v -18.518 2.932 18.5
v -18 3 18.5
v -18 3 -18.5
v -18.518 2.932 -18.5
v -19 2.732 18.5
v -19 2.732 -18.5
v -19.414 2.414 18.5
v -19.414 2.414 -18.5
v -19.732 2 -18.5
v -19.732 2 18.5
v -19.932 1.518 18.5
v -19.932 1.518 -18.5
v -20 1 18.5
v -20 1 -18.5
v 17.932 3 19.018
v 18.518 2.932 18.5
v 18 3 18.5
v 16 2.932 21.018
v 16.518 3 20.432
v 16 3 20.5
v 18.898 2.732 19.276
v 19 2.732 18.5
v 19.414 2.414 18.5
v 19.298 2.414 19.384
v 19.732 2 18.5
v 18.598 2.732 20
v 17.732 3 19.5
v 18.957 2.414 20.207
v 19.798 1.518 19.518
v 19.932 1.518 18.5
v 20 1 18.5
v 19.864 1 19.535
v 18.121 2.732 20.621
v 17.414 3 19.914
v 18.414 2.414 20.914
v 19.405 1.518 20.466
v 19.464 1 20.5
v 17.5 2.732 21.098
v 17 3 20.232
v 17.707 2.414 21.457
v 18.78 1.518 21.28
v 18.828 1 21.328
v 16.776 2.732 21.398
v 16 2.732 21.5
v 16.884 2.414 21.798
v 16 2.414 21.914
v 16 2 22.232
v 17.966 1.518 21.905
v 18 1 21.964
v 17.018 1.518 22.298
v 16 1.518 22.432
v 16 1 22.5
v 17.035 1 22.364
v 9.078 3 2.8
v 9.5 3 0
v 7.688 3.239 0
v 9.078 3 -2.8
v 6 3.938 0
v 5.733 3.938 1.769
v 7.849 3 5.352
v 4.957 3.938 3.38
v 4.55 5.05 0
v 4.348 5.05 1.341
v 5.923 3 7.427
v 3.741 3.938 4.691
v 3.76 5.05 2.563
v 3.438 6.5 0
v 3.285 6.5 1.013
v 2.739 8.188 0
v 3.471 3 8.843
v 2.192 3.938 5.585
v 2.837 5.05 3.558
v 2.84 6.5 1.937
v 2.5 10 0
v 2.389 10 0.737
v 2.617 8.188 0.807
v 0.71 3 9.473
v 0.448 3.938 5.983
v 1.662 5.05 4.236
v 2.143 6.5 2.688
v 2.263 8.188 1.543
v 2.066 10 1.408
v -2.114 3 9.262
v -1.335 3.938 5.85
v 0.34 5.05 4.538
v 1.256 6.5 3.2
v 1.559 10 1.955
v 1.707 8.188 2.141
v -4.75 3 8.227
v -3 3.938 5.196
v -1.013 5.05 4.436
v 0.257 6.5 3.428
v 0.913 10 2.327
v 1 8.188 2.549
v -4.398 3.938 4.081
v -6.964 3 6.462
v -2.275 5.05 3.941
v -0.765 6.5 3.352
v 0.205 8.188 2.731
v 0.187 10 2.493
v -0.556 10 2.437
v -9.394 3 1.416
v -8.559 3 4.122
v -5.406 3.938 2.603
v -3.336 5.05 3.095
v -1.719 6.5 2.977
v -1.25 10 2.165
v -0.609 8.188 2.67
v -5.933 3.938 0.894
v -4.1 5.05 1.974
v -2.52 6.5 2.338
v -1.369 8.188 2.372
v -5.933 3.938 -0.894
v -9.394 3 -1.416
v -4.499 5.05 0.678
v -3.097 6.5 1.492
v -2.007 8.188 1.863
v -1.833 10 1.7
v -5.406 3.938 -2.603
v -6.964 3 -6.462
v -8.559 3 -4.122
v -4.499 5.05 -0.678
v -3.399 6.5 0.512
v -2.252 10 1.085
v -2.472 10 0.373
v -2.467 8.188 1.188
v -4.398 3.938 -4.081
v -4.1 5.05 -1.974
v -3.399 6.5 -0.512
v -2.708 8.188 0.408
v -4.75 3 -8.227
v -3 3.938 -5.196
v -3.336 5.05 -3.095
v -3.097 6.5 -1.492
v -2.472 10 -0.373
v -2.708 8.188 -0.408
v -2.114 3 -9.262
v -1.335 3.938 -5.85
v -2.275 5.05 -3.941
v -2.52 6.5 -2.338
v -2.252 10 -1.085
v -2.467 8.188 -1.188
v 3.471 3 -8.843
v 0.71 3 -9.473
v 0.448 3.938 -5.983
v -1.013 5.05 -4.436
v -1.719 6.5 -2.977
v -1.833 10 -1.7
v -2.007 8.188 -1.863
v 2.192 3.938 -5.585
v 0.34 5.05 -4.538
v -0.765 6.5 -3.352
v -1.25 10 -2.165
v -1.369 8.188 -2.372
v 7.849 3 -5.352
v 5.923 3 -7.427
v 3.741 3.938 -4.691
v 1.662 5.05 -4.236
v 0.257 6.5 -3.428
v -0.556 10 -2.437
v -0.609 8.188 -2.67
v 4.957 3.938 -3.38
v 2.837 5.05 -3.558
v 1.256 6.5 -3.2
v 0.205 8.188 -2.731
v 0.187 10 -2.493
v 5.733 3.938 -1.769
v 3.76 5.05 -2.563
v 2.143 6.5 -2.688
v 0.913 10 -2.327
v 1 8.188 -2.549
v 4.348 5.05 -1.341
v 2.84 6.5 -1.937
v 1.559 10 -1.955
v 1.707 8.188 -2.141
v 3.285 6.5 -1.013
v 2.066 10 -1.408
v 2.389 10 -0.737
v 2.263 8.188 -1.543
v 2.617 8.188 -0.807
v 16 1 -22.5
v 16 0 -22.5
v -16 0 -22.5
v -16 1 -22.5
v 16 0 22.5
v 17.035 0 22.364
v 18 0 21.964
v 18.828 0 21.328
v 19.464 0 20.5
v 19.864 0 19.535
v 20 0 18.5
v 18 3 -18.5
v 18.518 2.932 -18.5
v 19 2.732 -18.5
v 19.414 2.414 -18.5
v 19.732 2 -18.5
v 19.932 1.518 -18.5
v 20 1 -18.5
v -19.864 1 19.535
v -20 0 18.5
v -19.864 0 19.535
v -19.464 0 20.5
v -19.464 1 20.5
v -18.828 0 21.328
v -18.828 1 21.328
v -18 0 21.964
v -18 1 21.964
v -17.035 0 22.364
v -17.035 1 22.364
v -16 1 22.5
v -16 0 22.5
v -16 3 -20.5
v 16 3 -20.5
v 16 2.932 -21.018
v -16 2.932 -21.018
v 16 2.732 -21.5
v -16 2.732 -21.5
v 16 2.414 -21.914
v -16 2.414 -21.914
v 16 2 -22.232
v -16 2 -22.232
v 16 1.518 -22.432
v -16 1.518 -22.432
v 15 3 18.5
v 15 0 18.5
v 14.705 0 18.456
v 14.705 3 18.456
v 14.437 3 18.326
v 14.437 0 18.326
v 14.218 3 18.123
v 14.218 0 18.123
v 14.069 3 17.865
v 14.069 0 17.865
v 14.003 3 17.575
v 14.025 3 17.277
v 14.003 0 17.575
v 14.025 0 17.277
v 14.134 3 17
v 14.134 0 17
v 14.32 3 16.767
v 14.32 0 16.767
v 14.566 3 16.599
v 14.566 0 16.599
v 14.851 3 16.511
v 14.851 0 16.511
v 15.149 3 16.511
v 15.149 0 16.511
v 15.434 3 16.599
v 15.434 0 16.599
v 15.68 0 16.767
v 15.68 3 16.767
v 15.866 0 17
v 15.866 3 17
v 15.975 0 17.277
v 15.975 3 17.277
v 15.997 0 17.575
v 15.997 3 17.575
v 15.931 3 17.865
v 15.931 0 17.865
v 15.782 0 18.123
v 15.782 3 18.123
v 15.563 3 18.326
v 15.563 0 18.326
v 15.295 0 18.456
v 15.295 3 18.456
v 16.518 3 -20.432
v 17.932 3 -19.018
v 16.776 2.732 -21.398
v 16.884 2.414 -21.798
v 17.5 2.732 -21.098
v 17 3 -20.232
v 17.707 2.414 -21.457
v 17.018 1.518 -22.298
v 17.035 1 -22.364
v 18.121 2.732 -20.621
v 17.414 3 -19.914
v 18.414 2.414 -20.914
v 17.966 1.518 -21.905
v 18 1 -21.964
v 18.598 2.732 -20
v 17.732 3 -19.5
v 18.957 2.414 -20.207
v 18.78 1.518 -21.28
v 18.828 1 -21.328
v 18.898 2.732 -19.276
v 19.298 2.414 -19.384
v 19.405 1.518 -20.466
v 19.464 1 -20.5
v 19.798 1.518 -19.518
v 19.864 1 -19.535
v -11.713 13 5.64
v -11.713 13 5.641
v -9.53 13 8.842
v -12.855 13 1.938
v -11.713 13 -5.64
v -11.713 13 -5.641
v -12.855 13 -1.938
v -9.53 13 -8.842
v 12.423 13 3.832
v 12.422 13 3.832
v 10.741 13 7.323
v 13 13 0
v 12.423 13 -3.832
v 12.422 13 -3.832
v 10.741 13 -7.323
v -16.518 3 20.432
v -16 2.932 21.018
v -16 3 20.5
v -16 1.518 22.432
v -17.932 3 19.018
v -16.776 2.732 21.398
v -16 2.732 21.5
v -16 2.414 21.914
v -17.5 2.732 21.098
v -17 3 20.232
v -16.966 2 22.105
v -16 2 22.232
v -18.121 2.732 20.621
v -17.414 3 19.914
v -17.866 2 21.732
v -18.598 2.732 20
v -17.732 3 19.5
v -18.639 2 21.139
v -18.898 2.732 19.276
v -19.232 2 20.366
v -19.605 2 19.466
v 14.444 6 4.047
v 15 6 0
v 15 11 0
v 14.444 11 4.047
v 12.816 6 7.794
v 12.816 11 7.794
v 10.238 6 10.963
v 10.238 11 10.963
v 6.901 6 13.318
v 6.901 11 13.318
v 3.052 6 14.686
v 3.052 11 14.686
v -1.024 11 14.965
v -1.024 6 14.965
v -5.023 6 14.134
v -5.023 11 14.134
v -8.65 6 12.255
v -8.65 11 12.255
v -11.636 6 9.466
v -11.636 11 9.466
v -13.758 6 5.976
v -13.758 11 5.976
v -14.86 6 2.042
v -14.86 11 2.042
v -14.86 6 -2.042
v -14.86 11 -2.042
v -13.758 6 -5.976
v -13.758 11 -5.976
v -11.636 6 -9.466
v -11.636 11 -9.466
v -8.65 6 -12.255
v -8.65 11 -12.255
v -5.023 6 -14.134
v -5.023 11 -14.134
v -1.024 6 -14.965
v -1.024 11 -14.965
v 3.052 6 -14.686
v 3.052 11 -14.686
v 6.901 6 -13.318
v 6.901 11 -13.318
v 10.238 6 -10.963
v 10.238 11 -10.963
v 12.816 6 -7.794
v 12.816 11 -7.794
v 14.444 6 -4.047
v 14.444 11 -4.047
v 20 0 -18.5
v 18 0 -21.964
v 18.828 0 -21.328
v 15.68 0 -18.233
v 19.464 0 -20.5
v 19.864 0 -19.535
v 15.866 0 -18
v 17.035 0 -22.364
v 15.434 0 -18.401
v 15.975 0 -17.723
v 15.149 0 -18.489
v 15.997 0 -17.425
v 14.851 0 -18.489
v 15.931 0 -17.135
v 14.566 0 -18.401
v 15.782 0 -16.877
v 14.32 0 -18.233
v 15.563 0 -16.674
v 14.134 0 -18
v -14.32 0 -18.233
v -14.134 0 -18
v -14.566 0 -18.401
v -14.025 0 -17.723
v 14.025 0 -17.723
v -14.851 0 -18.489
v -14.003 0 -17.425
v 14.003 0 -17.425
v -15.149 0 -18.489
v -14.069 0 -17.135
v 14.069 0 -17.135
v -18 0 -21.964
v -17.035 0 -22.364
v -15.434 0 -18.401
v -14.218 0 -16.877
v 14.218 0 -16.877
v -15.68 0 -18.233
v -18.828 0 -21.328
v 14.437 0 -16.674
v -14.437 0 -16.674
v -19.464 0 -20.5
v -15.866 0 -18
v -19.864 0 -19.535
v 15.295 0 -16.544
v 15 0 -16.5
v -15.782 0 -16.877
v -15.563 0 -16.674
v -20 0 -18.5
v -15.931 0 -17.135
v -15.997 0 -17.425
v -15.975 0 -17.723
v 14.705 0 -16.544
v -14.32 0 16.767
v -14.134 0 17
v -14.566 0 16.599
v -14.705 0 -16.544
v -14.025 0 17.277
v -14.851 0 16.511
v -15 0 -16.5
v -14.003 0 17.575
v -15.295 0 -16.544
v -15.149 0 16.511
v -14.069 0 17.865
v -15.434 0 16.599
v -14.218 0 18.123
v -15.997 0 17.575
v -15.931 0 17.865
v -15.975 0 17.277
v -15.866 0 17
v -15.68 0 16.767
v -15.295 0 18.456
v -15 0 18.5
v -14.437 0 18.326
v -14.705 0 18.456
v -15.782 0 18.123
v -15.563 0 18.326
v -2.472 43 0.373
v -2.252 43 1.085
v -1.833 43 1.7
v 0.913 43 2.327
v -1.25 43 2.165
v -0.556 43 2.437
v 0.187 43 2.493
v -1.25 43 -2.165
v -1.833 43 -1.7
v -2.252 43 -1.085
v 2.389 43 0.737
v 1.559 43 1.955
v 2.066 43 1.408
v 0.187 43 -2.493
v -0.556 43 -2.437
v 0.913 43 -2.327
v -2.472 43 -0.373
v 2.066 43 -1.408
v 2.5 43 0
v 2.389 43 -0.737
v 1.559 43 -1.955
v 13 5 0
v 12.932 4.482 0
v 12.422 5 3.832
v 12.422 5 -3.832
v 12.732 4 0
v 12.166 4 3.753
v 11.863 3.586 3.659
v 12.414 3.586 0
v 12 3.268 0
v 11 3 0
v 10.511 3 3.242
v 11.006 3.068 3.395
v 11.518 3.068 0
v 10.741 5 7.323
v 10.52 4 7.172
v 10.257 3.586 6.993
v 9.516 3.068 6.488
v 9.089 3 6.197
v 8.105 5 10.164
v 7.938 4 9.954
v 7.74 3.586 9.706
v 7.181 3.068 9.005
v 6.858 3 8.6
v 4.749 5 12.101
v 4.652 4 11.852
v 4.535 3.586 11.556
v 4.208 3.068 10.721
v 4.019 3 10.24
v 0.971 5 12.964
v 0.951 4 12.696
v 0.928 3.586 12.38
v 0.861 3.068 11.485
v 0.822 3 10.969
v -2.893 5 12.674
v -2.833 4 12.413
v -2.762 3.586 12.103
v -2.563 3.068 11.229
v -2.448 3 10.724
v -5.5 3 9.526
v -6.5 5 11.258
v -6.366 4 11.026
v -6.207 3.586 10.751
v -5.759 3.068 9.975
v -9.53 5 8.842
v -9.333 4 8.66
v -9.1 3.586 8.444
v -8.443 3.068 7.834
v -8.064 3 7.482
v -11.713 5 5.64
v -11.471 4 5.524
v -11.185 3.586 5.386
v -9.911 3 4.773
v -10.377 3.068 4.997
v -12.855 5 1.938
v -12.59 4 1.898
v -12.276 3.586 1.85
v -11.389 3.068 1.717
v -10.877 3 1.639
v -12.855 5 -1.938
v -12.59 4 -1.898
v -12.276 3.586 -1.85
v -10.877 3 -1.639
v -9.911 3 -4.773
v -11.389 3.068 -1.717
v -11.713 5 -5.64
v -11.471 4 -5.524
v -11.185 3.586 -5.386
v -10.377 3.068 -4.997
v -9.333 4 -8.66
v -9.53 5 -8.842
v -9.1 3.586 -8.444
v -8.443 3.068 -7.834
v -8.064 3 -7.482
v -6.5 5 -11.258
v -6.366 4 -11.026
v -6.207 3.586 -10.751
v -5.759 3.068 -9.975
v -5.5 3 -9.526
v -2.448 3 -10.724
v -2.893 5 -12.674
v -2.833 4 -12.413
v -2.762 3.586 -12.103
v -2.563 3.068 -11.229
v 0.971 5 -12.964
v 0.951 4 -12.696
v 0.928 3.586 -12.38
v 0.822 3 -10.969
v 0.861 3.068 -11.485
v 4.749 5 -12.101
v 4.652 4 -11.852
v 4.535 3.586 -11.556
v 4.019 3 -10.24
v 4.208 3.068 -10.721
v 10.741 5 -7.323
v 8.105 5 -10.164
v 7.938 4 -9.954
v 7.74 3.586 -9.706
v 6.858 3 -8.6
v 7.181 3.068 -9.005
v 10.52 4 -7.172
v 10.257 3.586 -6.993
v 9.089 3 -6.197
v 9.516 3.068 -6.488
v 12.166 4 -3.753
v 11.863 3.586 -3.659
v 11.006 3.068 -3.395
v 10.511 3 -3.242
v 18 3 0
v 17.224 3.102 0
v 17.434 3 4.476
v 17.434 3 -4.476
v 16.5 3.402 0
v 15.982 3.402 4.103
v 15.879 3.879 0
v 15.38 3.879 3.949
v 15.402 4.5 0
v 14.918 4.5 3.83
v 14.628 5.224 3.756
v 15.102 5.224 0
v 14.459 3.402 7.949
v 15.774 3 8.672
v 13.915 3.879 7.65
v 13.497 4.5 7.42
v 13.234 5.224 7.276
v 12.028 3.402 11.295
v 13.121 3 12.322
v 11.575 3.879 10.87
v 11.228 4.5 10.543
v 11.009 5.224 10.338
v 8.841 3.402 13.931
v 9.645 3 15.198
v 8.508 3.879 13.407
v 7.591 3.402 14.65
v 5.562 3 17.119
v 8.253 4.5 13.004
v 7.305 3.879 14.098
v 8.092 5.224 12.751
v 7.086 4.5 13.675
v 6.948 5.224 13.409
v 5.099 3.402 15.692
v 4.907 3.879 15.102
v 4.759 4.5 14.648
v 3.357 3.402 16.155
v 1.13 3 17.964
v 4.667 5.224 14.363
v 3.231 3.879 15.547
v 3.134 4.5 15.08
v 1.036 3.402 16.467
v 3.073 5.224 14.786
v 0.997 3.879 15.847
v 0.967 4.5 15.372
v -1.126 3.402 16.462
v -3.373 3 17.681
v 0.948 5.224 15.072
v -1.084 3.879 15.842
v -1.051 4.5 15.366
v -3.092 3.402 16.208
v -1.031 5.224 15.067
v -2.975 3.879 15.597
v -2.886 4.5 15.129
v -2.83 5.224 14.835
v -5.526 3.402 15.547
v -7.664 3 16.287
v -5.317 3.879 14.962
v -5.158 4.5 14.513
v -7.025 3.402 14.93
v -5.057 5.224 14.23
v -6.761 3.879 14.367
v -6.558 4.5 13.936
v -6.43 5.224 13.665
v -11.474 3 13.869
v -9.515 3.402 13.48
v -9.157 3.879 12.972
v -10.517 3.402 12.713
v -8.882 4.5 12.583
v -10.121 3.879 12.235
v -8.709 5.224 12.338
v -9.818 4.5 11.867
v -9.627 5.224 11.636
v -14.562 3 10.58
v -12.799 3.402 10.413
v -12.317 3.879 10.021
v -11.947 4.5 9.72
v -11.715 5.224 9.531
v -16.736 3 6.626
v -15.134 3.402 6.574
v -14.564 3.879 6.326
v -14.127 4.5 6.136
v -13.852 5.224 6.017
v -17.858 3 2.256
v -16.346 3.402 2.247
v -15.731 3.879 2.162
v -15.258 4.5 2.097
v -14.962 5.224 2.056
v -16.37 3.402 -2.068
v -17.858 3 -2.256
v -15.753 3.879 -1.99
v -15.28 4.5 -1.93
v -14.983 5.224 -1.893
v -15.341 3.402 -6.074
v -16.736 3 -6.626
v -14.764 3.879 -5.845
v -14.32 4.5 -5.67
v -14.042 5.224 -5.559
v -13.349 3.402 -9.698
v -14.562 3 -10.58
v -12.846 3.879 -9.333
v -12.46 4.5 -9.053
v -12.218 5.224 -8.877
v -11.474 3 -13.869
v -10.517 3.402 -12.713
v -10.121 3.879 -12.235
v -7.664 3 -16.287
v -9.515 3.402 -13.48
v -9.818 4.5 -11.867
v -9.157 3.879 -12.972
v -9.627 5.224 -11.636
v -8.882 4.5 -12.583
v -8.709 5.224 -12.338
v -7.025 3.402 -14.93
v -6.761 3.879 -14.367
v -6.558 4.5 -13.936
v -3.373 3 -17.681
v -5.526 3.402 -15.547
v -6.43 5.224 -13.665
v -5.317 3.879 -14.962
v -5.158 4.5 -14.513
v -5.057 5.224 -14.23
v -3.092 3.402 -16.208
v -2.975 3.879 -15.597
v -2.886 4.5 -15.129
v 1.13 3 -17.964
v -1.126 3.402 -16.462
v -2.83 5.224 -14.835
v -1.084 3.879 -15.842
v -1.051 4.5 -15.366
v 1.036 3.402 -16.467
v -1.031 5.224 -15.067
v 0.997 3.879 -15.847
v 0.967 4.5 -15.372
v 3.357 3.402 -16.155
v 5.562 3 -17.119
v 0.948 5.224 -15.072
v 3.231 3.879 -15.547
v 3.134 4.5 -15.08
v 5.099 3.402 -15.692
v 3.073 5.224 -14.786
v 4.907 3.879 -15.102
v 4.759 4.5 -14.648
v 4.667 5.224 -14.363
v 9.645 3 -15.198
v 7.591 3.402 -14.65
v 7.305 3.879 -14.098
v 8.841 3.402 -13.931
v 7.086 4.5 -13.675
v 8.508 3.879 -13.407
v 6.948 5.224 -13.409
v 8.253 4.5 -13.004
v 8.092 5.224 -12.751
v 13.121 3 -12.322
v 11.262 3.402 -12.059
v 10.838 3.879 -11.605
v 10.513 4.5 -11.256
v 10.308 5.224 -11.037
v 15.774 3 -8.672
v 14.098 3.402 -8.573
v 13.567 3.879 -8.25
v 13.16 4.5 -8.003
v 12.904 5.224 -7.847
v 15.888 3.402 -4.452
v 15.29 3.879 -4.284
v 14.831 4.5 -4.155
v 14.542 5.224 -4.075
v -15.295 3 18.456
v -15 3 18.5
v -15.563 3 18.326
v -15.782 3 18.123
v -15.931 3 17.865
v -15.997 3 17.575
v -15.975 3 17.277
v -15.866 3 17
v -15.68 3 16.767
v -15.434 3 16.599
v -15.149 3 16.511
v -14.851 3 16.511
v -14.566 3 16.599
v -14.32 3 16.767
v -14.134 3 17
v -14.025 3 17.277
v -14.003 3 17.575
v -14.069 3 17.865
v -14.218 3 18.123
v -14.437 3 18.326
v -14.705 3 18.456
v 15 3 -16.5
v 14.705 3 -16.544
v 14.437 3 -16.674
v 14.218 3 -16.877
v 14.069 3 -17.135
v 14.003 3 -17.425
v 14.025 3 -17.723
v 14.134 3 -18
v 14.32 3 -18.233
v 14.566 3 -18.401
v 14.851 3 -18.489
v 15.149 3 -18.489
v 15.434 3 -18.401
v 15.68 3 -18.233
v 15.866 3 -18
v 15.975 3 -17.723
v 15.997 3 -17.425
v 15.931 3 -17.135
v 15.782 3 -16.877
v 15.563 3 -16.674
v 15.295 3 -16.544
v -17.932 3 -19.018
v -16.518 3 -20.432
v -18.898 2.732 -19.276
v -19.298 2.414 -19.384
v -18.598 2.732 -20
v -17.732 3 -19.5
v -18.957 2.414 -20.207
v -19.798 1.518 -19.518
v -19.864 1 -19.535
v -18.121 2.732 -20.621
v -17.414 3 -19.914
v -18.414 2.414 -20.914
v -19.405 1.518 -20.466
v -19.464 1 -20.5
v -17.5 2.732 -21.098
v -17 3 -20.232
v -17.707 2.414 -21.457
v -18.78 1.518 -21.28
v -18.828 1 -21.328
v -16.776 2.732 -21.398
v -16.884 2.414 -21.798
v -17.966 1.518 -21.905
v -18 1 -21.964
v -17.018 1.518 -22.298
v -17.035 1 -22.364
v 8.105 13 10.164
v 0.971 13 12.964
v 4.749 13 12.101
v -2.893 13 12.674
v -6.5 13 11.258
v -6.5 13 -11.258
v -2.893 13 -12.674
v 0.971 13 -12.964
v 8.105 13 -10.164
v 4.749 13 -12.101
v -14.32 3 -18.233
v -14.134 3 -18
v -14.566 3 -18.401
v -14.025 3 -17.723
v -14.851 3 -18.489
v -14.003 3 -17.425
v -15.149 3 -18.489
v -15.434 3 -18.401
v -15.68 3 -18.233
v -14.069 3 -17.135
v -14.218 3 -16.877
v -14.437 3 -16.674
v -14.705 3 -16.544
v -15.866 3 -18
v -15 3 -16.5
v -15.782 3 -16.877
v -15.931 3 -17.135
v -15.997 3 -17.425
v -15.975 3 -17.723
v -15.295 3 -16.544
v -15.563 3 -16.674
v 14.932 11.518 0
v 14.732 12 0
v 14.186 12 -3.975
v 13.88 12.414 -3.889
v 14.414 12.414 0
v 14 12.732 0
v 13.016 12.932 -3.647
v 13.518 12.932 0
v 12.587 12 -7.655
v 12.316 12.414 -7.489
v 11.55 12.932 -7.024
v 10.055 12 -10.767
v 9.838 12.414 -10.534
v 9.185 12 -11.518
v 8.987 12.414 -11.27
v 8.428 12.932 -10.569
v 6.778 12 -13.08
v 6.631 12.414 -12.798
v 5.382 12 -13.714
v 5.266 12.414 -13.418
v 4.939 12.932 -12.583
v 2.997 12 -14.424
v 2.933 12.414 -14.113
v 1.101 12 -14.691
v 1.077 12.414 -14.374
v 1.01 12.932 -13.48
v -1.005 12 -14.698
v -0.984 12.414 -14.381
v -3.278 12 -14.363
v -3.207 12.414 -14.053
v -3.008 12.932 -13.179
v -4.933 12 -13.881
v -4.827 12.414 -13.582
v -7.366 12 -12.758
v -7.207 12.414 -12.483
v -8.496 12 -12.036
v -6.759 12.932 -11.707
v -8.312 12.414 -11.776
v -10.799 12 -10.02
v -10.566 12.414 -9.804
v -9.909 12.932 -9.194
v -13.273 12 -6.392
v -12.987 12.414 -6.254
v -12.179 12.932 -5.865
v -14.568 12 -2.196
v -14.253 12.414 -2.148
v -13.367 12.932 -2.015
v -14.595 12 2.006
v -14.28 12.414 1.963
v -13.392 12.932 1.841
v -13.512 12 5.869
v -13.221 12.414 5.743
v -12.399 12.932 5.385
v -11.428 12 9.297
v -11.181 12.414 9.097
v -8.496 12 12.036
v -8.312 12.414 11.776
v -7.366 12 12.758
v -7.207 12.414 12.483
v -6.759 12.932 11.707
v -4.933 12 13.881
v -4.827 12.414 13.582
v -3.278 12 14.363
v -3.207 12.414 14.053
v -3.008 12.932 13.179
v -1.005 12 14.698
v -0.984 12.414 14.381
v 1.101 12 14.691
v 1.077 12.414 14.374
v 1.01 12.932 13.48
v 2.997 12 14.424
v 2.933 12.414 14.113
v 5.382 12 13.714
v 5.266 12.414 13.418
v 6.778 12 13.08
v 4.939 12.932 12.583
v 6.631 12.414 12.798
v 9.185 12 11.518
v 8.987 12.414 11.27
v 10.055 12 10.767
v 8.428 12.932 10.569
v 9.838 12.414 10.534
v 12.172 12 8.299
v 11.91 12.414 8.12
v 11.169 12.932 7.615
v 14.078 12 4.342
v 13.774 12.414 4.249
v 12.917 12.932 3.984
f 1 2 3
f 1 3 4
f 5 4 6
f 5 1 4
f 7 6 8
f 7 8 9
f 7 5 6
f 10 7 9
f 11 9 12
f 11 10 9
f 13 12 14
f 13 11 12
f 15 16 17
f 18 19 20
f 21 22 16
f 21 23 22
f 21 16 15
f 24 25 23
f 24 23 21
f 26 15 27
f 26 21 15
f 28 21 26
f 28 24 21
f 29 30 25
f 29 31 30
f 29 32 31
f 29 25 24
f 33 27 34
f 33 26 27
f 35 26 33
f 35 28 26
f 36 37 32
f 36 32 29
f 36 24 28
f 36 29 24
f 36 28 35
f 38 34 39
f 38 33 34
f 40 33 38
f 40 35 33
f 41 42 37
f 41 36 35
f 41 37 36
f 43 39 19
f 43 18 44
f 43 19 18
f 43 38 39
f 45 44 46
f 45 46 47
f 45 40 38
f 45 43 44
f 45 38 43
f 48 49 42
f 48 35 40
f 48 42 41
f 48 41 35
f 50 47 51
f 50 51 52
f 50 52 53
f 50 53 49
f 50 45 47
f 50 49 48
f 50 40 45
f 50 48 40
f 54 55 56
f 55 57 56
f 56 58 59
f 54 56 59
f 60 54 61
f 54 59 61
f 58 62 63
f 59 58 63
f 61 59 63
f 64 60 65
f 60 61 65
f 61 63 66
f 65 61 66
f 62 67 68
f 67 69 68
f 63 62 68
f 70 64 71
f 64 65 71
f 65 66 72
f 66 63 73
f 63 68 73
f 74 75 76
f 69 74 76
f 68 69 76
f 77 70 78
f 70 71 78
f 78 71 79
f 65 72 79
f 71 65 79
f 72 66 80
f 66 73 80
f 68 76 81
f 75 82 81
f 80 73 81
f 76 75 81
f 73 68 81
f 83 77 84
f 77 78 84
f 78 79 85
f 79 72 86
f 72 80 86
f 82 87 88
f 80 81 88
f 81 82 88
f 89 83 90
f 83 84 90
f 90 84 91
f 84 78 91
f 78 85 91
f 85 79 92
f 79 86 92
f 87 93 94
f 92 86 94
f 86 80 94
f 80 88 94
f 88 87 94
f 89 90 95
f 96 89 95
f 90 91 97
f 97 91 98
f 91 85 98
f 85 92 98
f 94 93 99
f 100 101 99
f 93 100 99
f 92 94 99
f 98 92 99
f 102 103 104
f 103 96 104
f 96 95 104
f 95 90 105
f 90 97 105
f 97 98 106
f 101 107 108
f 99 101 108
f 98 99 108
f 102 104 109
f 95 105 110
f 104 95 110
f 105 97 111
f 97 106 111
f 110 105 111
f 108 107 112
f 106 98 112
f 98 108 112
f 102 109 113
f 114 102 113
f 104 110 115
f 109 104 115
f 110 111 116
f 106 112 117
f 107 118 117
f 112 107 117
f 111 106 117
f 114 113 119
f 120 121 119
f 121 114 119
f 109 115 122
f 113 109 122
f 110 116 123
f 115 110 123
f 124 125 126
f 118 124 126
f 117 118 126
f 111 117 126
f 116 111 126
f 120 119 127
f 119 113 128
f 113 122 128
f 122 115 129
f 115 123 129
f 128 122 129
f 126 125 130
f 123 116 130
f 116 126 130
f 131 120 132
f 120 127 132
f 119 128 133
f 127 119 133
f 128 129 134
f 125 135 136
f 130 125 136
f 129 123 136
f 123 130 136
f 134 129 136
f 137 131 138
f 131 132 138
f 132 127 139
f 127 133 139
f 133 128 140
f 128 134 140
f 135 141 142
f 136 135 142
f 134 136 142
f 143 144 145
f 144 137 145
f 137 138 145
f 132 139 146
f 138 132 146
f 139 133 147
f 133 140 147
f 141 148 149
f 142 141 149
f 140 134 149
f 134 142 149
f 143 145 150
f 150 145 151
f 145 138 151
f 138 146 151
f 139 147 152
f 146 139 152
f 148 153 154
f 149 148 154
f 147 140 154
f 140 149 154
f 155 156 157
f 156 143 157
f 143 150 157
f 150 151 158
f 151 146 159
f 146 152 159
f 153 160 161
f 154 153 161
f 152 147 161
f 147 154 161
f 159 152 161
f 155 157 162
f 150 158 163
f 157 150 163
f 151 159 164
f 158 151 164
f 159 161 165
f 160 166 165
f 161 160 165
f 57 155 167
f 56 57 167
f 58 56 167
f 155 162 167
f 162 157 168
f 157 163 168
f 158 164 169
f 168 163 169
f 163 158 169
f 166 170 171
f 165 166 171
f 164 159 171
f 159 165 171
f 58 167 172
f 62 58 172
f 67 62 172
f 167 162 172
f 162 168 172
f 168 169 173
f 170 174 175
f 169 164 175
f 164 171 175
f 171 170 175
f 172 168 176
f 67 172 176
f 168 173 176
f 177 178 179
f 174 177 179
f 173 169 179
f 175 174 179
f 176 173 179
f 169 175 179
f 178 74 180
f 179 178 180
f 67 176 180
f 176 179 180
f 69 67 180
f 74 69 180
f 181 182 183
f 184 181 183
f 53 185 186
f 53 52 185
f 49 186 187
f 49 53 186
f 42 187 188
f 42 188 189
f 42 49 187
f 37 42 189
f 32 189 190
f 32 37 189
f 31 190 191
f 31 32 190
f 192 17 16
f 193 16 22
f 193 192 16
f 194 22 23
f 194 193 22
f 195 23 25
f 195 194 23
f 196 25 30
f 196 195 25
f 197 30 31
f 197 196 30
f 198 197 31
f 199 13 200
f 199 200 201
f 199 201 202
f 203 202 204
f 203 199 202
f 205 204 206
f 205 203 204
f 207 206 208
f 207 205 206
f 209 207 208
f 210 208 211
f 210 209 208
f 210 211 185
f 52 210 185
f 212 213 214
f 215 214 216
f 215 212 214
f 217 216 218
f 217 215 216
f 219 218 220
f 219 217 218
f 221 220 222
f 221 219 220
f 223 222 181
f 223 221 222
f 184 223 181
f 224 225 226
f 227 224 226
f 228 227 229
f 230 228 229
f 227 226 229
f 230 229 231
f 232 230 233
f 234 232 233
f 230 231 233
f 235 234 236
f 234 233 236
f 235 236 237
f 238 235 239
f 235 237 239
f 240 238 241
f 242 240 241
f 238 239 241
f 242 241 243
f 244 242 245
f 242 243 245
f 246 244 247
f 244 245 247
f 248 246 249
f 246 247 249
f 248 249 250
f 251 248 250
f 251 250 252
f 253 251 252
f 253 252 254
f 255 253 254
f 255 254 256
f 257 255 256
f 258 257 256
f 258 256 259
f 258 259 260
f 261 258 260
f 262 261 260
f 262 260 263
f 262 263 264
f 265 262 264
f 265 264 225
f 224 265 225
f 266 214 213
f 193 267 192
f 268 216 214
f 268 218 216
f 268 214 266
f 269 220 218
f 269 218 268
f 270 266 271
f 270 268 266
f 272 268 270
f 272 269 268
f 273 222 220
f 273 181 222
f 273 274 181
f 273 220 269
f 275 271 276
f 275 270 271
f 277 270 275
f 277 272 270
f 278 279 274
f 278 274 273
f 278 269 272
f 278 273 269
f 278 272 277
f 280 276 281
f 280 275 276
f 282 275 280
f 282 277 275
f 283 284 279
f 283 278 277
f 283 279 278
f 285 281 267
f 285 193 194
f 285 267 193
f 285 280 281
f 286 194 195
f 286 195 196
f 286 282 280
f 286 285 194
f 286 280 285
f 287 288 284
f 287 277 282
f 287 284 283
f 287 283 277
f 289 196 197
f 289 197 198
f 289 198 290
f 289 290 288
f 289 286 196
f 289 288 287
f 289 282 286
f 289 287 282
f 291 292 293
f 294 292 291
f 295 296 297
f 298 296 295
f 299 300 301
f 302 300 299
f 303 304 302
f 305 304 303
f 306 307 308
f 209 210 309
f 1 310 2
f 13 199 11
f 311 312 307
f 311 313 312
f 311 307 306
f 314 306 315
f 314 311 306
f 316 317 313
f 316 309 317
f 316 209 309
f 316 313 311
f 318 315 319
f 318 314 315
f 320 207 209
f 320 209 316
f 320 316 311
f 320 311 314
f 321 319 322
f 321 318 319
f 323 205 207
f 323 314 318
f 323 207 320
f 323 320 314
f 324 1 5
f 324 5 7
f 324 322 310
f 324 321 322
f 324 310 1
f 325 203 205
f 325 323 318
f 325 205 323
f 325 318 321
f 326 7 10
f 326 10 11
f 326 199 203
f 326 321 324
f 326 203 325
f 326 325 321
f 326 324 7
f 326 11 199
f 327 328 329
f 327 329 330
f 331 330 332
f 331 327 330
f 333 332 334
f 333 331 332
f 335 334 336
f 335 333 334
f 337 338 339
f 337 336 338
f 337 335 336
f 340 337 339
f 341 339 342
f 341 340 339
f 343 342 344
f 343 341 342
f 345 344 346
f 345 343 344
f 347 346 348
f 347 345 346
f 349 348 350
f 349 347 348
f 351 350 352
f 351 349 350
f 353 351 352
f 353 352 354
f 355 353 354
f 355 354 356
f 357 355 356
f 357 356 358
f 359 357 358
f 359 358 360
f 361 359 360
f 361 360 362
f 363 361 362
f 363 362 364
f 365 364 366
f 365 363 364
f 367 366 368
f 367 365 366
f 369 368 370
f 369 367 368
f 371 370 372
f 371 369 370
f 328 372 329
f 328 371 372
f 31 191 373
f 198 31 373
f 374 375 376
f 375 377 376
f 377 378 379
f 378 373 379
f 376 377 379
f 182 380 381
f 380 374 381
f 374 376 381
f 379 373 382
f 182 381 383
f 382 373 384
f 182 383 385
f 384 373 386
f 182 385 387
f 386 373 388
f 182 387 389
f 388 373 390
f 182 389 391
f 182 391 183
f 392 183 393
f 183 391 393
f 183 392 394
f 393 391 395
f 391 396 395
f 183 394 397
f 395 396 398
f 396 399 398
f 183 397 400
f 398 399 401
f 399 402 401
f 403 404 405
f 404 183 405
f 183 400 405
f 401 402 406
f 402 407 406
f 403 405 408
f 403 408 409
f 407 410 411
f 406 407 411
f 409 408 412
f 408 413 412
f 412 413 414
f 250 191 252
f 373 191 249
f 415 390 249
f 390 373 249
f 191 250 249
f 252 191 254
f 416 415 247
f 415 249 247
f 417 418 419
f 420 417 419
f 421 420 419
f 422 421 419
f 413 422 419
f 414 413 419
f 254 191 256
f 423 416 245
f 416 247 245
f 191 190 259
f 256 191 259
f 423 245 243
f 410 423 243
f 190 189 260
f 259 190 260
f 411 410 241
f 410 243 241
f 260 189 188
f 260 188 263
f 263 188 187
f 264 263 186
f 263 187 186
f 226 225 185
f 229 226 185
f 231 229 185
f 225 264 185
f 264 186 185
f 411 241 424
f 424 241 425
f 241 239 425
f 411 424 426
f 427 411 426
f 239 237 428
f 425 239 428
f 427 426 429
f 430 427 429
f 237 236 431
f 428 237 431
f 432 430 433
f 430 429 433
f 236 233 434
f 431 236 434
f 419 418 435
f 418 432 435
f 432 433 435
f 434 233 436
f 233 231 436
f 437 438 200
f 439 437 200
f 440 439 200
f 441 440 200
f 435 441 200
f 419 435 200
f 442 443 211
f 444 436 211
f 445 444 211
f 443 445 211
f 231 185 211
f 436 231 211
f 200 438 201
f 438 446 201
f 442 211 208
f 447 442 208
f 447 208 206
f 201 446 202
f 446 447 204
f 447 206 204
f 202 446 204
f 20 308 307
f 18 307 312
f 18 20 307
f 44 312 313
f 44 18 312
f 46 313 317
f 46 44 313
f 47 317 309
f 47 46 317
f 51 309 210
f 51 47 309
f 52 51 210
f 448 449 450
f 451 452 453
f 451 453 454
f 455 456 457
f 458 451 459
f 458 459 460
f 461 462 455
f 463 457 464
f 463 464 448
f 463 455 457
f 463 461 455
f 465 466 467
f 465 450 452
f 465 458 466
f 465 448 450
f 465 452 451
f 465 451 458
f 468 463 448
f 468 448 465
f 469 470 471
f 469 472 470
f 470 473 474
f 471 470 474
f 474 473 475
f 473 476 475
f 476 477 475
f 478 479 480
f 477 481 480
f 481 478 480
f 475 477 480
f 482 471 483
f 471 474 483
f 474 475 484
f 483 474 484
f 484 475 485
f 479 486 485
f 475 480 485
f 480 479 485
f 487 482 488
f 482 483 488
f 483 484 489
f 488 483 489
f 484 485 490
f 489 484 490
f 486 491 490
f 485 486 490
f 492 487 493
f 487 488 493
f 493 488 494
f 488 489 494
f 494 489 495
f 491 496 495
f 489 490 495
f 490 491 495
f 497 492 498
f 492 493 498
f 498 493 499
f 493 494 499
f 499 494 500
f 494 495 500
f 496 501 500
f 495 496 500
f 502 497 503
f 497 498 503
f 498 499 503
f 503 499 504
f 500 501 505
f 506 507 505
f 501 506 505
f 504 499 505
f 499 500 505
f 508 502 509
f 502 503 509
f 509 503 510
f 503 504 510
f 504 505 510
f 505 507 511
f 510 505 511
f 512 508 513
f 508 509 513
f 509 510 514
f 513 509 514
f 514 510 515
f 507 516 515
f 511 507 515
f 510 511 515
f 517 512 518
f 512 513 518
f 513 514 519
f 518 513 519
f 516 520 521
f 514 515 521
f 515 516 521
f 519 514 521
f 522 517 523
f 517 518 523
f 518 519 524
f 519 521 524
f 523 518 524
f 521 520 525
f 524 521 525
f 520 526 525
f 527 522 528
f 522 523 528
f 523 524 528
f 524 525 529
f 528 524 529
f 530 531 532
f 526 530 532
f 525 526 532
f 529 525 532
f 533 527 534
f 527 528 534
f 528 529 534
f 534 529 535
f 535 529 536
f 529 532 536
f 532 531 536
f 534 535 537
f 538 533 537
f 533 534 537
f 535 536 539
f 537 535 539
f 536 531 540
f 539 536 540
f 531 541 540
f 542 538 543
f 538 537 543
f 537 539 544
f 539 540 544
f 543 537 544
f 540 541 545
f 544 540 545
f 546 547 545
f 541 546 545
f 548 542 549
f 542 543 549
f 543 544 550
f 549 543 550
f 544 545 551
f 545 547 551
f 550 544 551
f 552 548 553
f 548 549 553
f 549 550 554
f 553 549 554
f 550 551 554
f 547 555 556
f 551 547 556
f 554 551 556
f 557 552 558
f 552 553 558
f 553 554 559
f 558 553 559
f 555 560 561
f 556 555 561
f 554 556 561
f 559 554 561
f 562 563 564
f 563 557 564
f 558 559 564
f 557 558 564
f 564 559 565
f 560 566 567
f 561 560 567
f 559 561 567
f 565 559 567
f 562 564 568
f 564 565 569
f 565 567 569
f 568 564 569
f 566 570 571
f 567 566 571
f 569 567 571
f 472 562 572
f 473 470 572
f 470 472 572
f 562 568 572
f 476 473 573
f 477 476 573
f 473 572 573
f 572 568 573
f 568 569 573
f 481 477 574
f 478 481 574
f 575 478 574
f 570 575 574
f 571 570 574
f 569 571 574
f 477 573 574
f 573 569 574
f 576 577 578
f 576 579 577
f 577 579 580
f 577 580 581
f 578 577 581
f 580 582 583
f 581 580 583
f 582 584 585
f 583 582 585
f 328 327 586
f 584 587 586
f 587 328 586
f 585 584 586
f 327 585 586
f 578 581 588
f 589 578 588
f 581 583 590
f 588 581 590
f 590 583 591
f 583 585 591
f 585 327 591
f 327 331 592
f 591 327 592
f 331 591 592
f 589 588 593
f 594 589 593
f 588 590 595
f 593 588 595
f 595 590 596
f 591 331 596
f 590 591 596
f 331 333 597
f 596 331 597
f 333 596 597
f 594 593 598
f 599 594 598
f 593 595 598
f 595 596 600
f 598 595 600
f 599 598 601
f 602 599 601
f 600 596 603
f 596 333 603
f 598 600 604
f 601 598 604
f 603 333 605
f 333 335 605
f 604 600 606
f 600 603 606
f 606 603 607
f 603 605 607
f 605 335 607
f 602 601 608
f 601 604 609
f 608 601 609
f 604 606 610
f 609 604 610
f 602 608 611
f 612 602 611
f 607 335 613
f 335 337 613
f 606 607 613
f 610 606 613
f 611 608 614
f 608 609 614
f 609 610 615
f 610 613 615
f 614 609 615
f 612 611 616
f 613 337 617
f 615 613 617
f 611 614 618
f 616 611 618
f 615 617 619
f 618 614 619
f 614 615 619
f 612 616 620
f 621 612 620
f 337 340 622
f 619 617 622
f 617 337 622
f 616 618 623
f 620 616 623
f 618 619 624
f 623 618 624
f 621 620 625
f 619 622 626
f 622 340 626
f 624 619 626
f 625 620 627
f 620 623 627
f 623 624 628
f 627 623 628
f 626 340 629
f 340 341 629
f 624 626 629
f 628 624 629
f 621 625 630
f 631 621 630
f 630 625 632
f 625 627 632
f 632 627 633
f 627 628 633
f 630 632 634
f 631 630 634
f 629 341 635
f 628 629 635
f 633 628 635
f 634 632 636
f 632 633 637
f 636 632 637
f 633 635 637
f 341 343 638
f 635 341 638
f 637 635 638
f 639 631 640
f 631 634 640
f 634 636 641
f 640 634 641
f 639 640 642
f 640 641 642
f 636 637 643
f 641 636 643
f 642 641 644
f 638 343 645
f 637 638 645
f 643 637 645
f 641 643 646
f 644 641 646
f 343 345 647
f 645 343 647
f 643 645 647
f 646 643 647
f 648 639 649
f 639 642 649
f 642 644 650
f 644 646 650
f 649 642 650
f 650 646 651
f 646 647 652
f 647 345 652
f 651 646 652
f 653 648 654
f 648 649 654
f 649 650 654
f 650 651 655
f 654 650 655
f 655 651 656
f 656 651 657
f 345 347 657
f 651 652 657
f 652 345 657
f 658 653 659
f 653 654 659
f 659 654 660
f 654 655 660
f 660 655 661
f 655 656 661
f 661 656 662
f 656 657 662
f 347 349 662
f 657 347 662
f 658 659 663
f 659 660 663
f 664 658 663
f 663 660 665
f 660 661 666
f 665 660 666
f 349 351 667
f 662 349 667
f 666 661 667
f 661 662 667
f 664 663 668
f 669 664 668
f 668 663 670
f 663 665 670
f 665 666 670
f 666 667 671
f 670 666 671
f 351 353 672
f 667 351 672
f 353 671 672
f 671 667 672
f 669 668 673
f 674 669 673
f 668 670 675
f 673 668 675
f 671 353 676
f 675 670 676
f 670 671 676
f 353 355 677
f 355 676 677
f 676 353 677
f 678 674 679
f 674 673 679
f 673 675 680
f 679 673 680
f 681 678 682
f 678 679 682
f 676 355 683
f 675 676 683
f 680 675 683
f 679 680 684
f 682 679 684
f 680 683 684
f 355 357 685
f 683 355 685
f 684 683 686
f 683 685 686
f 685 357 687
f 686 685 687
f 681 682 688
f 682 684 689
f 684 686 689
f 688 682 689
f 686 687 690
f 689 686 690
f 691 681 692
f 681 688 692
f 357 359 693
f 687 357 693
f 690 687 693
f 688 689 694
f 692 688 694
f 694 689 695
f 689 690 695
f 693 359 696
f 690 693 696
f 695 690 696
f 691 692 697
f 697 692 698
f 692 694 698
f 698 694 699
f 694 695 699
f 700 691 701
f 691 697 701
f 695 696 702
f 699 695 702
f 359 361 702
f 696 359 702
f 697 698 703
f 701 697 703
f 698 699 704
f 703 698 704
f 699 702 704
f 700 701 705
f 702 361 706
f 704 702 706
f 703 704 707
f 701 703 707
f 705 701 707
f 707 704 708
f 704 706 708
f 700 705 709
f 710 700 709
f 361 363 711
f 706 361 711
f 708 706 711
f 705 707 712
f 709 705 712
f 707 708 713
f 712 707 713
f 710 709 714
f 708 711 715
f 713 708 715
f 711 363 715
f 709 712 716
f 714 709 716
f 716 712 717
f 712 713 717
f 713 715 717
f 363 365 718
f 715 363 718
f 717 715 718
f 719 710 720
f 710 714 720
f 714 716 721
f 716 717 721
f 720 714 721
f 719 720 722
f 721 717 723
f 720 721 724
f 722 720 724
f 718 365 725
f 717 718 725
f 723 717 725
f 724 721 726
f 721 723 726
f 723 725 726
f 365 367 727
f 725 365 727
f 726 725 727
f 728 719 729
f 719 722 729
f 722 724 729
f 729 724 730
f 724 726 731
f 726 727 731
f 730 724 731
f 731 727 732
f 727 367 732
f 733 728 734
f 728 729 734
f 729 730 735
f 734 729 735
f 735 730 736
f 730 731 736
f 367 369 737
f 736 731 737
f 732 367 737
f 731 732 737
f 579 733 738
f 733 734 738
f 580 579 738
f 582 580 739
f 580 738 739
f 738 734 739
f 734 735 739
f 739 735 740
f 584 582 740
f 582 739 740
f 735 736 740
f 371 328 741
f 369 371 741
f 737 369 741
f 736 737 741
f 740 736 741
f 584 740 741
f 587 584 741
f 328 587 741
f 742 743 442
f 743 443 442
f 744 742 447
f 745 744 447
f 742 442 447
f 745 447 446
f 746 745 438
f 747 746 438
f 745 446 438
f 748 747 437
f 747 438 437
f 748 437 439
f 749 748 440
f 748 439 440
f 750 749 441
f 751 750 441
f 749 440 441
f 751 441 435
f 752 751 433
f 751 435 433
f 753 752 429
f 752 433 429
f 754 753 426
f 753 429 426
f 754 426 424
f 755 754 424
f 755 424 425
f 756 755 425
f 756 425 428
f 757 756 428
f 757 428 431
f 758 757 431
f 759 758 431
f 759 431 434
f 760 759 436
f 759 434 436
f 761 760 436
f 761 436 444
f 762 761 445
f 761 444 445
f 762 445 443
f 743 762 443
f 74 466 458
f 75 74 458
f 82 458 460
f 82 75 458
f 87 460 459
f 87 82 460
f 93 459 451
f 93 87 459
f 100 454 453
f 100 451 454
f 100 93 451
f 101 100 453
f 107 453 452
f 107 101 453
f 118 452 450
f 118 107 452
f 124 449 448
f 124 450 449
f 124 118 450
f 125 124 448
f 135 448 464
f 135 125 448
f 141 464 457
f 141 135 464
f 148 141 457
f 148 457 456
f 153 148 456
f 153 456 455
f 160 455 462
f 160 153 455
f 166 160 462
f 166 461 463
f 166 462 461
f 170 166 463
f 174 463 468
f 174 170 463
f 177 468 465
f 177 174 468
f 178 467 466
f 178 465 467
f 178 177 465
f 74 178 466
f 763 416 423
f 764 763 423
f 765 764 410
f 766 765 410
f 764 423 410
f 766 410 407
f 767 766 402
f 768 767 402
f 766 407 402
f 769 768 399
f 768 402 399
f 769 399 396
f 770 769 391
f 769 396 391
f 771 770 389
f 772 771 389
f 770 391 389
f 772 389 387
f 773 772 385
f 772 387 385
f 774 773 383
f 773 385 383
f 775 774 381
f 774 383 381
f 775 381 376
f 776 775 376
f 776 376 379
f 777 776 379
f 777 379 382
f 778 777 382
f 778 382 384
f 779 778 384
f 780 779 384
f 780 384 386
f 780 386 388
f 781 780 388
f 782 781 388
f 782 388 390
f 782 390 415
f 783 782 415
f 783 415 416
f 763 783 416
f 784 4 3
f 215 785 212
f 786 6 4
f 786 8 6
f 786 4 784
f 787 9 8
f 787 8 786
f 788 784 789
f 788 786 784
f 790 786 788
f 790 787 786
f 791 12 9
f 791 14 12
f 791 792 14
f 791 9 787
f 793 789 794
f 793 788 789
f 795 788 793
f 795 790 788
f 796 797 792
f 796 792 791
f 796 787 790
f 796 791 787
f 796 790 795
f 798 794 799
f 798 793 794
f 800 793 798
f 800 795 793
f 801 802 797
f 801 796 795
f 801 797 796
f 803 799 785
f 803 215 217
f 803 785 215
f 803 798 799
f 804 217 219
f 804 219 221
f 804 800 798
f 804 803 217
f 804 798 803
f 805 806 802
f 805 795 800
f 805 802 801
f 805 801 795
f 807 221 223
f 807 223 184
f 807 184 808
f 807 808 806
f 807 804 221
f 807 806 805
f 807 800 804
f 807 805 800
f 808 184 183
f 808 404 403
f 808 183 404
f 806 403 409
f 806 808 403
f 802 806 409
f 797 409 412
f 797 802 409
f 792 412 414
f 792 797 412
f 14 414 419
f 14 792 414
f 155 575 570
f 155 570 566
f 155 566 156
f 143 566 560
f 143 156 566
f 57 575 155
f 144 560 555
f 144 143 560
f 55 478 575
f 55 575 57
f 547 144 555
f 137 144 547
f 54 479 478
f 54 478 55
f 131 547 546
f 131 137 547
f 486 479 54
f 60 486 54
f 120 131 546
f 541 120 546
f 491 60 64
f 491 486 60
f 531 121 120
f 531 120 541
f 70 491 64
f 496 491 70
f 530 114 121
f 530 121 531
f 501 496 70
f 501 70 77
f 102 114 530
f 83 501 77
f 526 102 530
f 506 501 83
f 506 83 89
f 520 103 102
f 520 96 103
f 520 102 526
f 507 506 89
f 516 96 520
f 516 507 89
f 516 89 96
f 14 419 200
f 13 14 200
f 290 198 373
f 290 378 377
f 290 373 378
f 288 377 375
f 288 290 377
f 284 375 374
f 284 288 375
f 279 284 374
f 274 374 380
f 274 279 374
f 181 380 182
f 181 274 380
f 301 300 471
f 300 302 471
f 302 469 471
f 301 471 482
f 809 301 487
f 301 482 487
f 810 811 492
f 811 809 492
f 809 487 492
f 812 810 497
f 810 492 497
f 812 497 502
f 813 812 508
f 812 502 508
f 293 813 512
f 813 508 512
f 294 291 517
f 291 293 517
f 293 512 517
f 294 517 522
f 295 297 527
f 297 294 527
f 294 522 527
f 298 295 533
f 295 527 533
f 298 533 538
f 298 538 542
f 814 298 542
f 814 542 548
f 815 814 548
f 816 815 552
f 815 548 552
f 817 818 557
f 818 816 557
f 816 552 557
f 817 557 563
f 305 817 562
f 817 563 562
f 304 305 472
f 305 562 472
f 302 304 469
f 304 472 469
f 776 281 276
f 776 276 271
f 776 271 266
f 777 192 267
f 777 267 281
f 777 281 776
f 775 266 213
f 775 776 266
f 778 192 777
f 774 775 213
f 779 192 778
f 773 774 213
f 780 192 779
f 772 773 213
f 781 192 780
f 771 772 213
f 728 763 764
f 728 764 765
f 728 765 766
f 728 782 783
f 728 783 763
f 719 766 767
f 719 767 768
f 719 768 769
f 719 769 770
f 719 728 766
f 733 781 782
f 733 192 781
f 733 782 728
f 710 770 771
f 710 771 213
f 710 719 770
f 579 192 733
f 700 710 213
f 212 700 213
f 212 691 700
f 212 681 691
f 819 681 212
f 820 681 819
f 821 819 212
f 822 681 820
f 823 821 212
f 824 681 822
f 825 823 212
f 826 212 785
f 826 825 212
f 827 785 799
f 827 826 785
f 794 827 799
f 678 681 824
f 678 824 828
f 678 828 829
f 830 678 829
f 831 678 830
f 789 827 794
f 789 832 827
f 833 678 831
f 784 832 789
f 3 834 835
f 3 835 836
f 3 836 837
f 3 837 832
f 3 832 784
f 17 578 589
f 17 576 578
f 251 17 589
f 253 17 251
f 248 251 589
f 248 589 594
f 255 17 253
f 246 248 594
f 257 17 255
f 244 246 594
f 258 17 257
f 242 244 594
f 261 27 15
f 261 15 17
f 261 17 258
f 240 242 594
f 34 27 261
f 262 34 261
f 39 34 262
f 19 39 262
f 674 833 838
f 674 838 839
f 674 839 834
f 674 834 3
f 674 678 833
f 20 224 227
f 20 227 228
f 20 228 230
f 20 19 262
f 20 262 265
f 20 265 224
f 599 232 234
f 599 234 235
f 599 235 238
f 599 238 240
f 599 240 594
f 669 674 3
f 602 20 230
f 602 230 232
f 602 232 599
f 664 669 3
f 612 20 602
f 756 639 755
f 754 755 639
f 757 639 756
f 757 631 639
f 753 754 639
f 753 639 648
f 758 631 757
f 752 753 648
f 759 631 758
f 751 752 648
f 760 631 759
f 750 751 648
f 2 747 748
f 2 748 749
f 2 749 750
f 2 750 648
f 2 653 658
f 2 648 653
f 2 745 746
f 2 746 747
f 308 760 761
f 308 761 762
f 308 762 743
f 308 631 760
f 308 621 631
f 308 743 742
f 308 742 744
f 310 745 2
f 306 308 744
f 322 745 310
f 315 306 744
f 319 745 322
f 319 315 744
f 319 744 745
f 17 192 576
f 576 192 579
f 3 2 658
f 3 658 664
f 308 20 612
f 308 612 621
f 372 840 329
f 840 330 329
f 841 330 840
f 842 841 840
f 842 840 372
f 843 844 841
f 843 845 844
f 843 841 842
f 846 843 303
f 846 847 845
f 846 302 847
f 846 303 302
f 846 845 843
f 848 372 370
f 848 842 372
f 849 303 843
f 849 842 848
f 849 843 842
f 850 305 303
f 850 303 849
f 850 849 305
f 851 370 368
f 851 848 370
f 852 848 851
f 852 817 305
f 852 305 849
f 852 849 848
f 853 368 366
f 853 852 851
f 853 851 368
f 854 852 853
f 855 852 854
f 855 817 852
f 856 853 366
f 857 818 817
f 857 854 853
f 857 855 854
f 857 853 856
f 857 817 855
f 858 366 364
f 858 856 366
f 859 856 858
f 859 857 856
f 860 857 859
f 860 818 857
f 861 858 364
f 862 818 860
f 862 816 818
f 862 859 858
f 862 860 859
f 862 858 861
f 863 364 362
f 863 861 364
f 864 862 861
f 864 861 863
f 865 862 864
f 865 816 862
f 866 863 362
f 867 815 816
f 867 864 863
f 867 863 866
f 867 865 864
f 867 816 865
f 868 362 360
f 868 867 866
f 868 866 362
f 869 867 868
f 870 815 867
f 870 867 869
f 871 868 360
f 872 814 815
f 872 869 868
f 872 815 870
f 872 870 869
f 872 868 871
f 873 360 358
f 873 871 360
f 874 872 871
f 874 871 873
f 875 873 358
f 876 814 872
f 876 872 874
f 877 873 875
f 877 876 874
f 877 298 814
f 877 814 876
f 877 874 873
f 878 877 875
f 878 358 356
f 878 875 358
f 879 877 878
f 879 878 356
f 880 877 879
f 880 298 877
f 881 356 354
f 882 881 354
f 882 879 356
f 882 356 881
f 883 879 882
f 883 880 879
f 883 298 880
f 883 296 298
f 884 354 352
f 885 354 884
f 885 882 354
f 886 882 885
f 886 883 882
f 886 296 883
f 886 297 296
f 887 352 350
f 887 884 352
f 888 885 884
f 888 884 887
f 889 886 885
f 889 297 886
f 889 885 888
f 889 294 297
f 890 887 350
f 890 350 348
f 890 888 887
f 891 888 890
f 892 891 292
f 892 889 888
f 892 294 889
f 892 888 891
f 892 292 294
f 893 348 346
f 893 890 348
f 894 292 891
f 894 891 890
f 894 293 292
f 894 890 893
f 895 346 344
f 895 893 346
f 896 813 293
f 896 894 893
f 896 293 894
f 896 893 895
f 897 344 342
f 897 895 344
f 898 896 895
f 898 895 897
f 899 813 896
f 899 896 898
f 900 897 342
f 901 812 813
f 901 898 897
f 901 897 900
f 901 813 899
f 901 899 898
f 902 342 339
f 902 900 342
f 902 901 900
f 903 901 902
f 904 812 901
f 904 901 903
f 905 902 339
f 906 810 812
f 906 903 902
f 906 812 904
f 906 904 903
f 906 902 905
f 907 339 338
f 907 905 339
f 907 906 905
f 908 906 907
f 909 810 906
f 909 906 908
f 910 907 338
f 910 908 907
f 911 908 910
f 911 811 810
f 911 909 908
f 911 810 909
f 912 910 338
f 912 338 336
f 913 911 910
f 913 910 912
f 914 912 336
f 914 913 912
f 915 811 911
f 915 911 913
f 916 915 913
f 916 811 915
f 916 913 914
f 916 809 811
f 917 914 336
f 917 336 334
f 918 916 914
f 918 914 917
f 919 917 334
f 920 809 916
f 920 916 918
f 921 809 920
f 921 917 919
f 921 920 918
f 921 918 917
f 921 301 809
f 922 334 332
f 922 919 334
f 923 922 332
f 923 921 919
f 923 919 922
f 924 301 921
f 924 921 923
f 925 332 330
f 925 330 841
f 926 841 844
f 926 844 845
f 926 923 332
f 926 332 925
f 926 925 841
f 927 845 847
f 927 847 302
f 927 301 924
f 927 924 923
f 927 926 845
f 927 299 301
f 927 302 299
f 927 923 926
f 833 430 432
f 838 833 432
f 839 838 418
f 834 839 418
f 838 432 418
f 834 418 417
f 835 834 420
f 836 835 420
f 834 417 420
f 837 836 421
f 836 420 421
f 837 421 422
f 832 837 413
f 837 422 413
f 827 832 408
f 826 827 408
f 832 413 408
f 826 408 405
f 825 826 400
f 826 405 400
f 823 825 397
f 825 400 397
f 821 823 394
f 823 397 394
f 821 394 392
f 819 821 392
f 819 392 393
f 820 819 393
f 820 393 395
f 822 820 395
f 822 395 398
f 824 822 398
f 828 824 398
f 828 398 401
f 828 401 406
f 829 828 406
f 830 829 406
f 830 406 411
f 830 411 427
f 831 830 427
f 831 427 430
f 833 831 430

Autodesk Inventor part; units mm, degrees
ref_plane "YZ Plane" through (0, 0, 0) normal (1, 0, 0) x (0, 1, 0)
ref_plane "XZ Plane" through (0, 0, 0) normal (0, 1, 0) x (-1, 0, 0)
ref_plane "XY Plane" through (0, 0, 0) normal (0, 0, 1) x (1, 0, 0)
sketch "Sketch1" plane through (0, 0, 0) normal (0, 1, 0) x (-1, 0, 0)
  line L0 (20, 22.5) -> (-20, 22.5)
  line L1 (-20, 22.5) -> (-20, -22.5)
  line L2 (-20, -22.5) -> (20, -22.5)
  line L3 (20, -22.5) -> (20, 22.5)
  point P0 (0, 0)
  point P1 (-20, 0)
  point P2 (20, 0)
  point P3 (0, 22.5)
  point P4 (0, -22.5)
  dimension "d2" = 45
  dimension "d3" = 40
extrude "Extrusion1" add sketch "Sketch1" along normal blind 3
sketch "Sketch2" plane through (0, 3, 0) normal (0, 1, 0) x (1, 0, 0)
  circle A0 centre (0, 0) radius 2.5
  dimension "d4" = 5
extrude "Extrusion2" add sketch "Sketch2" along normal blind 40
fillet "Fillet1" radius 7 1 edges at (-2.5, 3, 0)
sketch "Sketch3" plane through (0, 3, 0) normal (0, 1, 0) x (1, 0, 0)
  circle A0 centre (0, 0) radius 13
  circle A1 centre (0, 0) radius 15
  dimension "d8" = 26
  dimension "d9" = 30
extrude "Extrusion3" add sketch "Sketch3" along normal blind 10
sketch "Sketch4" plane through (0, 3, 0) normal (0, 1, 0) x (1, 0, 0)
  line L0 (20, 22.5) -> (-20, 22.5) projected
  line L1 (20, -22.5) -> (20, 22.5) projected
  line L2 (-20, -22.5) -> (20, -22.5) projected
  line L3 (-20, 22.5) -> (-20, -22.5) projected
  point P0 (0, 0)
  point P1 (15, -17.5)
  point P2 (15, 17.5)
  point P3 (-15, 17.5)
  point P4 (-15, -17.5)
  dimension "d12" = 5
  dimension "d13" = 5
  dimension "d14" = 5
  dimension "d15" = 5
  dimension "d16" = 5
  dimension "d17" = 5
  dimension "d18" = 5
  dimension "d19" = 5
hole "Hole1" at (15, 3, 17.5) at (15, 3, -17.5) at (-15, 3, -17.5) at (-15, 3, 17.5) direction (0, -1, 0) diameter 2 end through all
fillet "Fillet2" radius 3 1 edges at (-15, 3, 0)
fillet "Fillet3" radius 2 1 edges at (-13, 3, 0)
fillet "Fillet4" radius 4 4 edges at (20, 1.5, 22.5) (20, 1.5, -22.5) (-20, 1.5, 22.5) (-20, 1.5, -22.5)
fillet "Fillet5" radius 2 8 edges at (-18.8284, 3, 21.3284) (0, 3, 22.5) (18.8284, 3, 21.3284) (20, 3, 0) (18.8284, 3, -21.3284) (0, 3, -22.5) (-18.8284, 3, -21.3284) (-20, 3, 0)
fillet "Fillet6" radius 2 1 edges at (-15, 13, 0)
equation "\"d13\" = d12"
equation "\"d14\" = d15"
equation "\"d17\" = d16"
equation "\"d19\" = d18"
properties part number "Upper_part"
